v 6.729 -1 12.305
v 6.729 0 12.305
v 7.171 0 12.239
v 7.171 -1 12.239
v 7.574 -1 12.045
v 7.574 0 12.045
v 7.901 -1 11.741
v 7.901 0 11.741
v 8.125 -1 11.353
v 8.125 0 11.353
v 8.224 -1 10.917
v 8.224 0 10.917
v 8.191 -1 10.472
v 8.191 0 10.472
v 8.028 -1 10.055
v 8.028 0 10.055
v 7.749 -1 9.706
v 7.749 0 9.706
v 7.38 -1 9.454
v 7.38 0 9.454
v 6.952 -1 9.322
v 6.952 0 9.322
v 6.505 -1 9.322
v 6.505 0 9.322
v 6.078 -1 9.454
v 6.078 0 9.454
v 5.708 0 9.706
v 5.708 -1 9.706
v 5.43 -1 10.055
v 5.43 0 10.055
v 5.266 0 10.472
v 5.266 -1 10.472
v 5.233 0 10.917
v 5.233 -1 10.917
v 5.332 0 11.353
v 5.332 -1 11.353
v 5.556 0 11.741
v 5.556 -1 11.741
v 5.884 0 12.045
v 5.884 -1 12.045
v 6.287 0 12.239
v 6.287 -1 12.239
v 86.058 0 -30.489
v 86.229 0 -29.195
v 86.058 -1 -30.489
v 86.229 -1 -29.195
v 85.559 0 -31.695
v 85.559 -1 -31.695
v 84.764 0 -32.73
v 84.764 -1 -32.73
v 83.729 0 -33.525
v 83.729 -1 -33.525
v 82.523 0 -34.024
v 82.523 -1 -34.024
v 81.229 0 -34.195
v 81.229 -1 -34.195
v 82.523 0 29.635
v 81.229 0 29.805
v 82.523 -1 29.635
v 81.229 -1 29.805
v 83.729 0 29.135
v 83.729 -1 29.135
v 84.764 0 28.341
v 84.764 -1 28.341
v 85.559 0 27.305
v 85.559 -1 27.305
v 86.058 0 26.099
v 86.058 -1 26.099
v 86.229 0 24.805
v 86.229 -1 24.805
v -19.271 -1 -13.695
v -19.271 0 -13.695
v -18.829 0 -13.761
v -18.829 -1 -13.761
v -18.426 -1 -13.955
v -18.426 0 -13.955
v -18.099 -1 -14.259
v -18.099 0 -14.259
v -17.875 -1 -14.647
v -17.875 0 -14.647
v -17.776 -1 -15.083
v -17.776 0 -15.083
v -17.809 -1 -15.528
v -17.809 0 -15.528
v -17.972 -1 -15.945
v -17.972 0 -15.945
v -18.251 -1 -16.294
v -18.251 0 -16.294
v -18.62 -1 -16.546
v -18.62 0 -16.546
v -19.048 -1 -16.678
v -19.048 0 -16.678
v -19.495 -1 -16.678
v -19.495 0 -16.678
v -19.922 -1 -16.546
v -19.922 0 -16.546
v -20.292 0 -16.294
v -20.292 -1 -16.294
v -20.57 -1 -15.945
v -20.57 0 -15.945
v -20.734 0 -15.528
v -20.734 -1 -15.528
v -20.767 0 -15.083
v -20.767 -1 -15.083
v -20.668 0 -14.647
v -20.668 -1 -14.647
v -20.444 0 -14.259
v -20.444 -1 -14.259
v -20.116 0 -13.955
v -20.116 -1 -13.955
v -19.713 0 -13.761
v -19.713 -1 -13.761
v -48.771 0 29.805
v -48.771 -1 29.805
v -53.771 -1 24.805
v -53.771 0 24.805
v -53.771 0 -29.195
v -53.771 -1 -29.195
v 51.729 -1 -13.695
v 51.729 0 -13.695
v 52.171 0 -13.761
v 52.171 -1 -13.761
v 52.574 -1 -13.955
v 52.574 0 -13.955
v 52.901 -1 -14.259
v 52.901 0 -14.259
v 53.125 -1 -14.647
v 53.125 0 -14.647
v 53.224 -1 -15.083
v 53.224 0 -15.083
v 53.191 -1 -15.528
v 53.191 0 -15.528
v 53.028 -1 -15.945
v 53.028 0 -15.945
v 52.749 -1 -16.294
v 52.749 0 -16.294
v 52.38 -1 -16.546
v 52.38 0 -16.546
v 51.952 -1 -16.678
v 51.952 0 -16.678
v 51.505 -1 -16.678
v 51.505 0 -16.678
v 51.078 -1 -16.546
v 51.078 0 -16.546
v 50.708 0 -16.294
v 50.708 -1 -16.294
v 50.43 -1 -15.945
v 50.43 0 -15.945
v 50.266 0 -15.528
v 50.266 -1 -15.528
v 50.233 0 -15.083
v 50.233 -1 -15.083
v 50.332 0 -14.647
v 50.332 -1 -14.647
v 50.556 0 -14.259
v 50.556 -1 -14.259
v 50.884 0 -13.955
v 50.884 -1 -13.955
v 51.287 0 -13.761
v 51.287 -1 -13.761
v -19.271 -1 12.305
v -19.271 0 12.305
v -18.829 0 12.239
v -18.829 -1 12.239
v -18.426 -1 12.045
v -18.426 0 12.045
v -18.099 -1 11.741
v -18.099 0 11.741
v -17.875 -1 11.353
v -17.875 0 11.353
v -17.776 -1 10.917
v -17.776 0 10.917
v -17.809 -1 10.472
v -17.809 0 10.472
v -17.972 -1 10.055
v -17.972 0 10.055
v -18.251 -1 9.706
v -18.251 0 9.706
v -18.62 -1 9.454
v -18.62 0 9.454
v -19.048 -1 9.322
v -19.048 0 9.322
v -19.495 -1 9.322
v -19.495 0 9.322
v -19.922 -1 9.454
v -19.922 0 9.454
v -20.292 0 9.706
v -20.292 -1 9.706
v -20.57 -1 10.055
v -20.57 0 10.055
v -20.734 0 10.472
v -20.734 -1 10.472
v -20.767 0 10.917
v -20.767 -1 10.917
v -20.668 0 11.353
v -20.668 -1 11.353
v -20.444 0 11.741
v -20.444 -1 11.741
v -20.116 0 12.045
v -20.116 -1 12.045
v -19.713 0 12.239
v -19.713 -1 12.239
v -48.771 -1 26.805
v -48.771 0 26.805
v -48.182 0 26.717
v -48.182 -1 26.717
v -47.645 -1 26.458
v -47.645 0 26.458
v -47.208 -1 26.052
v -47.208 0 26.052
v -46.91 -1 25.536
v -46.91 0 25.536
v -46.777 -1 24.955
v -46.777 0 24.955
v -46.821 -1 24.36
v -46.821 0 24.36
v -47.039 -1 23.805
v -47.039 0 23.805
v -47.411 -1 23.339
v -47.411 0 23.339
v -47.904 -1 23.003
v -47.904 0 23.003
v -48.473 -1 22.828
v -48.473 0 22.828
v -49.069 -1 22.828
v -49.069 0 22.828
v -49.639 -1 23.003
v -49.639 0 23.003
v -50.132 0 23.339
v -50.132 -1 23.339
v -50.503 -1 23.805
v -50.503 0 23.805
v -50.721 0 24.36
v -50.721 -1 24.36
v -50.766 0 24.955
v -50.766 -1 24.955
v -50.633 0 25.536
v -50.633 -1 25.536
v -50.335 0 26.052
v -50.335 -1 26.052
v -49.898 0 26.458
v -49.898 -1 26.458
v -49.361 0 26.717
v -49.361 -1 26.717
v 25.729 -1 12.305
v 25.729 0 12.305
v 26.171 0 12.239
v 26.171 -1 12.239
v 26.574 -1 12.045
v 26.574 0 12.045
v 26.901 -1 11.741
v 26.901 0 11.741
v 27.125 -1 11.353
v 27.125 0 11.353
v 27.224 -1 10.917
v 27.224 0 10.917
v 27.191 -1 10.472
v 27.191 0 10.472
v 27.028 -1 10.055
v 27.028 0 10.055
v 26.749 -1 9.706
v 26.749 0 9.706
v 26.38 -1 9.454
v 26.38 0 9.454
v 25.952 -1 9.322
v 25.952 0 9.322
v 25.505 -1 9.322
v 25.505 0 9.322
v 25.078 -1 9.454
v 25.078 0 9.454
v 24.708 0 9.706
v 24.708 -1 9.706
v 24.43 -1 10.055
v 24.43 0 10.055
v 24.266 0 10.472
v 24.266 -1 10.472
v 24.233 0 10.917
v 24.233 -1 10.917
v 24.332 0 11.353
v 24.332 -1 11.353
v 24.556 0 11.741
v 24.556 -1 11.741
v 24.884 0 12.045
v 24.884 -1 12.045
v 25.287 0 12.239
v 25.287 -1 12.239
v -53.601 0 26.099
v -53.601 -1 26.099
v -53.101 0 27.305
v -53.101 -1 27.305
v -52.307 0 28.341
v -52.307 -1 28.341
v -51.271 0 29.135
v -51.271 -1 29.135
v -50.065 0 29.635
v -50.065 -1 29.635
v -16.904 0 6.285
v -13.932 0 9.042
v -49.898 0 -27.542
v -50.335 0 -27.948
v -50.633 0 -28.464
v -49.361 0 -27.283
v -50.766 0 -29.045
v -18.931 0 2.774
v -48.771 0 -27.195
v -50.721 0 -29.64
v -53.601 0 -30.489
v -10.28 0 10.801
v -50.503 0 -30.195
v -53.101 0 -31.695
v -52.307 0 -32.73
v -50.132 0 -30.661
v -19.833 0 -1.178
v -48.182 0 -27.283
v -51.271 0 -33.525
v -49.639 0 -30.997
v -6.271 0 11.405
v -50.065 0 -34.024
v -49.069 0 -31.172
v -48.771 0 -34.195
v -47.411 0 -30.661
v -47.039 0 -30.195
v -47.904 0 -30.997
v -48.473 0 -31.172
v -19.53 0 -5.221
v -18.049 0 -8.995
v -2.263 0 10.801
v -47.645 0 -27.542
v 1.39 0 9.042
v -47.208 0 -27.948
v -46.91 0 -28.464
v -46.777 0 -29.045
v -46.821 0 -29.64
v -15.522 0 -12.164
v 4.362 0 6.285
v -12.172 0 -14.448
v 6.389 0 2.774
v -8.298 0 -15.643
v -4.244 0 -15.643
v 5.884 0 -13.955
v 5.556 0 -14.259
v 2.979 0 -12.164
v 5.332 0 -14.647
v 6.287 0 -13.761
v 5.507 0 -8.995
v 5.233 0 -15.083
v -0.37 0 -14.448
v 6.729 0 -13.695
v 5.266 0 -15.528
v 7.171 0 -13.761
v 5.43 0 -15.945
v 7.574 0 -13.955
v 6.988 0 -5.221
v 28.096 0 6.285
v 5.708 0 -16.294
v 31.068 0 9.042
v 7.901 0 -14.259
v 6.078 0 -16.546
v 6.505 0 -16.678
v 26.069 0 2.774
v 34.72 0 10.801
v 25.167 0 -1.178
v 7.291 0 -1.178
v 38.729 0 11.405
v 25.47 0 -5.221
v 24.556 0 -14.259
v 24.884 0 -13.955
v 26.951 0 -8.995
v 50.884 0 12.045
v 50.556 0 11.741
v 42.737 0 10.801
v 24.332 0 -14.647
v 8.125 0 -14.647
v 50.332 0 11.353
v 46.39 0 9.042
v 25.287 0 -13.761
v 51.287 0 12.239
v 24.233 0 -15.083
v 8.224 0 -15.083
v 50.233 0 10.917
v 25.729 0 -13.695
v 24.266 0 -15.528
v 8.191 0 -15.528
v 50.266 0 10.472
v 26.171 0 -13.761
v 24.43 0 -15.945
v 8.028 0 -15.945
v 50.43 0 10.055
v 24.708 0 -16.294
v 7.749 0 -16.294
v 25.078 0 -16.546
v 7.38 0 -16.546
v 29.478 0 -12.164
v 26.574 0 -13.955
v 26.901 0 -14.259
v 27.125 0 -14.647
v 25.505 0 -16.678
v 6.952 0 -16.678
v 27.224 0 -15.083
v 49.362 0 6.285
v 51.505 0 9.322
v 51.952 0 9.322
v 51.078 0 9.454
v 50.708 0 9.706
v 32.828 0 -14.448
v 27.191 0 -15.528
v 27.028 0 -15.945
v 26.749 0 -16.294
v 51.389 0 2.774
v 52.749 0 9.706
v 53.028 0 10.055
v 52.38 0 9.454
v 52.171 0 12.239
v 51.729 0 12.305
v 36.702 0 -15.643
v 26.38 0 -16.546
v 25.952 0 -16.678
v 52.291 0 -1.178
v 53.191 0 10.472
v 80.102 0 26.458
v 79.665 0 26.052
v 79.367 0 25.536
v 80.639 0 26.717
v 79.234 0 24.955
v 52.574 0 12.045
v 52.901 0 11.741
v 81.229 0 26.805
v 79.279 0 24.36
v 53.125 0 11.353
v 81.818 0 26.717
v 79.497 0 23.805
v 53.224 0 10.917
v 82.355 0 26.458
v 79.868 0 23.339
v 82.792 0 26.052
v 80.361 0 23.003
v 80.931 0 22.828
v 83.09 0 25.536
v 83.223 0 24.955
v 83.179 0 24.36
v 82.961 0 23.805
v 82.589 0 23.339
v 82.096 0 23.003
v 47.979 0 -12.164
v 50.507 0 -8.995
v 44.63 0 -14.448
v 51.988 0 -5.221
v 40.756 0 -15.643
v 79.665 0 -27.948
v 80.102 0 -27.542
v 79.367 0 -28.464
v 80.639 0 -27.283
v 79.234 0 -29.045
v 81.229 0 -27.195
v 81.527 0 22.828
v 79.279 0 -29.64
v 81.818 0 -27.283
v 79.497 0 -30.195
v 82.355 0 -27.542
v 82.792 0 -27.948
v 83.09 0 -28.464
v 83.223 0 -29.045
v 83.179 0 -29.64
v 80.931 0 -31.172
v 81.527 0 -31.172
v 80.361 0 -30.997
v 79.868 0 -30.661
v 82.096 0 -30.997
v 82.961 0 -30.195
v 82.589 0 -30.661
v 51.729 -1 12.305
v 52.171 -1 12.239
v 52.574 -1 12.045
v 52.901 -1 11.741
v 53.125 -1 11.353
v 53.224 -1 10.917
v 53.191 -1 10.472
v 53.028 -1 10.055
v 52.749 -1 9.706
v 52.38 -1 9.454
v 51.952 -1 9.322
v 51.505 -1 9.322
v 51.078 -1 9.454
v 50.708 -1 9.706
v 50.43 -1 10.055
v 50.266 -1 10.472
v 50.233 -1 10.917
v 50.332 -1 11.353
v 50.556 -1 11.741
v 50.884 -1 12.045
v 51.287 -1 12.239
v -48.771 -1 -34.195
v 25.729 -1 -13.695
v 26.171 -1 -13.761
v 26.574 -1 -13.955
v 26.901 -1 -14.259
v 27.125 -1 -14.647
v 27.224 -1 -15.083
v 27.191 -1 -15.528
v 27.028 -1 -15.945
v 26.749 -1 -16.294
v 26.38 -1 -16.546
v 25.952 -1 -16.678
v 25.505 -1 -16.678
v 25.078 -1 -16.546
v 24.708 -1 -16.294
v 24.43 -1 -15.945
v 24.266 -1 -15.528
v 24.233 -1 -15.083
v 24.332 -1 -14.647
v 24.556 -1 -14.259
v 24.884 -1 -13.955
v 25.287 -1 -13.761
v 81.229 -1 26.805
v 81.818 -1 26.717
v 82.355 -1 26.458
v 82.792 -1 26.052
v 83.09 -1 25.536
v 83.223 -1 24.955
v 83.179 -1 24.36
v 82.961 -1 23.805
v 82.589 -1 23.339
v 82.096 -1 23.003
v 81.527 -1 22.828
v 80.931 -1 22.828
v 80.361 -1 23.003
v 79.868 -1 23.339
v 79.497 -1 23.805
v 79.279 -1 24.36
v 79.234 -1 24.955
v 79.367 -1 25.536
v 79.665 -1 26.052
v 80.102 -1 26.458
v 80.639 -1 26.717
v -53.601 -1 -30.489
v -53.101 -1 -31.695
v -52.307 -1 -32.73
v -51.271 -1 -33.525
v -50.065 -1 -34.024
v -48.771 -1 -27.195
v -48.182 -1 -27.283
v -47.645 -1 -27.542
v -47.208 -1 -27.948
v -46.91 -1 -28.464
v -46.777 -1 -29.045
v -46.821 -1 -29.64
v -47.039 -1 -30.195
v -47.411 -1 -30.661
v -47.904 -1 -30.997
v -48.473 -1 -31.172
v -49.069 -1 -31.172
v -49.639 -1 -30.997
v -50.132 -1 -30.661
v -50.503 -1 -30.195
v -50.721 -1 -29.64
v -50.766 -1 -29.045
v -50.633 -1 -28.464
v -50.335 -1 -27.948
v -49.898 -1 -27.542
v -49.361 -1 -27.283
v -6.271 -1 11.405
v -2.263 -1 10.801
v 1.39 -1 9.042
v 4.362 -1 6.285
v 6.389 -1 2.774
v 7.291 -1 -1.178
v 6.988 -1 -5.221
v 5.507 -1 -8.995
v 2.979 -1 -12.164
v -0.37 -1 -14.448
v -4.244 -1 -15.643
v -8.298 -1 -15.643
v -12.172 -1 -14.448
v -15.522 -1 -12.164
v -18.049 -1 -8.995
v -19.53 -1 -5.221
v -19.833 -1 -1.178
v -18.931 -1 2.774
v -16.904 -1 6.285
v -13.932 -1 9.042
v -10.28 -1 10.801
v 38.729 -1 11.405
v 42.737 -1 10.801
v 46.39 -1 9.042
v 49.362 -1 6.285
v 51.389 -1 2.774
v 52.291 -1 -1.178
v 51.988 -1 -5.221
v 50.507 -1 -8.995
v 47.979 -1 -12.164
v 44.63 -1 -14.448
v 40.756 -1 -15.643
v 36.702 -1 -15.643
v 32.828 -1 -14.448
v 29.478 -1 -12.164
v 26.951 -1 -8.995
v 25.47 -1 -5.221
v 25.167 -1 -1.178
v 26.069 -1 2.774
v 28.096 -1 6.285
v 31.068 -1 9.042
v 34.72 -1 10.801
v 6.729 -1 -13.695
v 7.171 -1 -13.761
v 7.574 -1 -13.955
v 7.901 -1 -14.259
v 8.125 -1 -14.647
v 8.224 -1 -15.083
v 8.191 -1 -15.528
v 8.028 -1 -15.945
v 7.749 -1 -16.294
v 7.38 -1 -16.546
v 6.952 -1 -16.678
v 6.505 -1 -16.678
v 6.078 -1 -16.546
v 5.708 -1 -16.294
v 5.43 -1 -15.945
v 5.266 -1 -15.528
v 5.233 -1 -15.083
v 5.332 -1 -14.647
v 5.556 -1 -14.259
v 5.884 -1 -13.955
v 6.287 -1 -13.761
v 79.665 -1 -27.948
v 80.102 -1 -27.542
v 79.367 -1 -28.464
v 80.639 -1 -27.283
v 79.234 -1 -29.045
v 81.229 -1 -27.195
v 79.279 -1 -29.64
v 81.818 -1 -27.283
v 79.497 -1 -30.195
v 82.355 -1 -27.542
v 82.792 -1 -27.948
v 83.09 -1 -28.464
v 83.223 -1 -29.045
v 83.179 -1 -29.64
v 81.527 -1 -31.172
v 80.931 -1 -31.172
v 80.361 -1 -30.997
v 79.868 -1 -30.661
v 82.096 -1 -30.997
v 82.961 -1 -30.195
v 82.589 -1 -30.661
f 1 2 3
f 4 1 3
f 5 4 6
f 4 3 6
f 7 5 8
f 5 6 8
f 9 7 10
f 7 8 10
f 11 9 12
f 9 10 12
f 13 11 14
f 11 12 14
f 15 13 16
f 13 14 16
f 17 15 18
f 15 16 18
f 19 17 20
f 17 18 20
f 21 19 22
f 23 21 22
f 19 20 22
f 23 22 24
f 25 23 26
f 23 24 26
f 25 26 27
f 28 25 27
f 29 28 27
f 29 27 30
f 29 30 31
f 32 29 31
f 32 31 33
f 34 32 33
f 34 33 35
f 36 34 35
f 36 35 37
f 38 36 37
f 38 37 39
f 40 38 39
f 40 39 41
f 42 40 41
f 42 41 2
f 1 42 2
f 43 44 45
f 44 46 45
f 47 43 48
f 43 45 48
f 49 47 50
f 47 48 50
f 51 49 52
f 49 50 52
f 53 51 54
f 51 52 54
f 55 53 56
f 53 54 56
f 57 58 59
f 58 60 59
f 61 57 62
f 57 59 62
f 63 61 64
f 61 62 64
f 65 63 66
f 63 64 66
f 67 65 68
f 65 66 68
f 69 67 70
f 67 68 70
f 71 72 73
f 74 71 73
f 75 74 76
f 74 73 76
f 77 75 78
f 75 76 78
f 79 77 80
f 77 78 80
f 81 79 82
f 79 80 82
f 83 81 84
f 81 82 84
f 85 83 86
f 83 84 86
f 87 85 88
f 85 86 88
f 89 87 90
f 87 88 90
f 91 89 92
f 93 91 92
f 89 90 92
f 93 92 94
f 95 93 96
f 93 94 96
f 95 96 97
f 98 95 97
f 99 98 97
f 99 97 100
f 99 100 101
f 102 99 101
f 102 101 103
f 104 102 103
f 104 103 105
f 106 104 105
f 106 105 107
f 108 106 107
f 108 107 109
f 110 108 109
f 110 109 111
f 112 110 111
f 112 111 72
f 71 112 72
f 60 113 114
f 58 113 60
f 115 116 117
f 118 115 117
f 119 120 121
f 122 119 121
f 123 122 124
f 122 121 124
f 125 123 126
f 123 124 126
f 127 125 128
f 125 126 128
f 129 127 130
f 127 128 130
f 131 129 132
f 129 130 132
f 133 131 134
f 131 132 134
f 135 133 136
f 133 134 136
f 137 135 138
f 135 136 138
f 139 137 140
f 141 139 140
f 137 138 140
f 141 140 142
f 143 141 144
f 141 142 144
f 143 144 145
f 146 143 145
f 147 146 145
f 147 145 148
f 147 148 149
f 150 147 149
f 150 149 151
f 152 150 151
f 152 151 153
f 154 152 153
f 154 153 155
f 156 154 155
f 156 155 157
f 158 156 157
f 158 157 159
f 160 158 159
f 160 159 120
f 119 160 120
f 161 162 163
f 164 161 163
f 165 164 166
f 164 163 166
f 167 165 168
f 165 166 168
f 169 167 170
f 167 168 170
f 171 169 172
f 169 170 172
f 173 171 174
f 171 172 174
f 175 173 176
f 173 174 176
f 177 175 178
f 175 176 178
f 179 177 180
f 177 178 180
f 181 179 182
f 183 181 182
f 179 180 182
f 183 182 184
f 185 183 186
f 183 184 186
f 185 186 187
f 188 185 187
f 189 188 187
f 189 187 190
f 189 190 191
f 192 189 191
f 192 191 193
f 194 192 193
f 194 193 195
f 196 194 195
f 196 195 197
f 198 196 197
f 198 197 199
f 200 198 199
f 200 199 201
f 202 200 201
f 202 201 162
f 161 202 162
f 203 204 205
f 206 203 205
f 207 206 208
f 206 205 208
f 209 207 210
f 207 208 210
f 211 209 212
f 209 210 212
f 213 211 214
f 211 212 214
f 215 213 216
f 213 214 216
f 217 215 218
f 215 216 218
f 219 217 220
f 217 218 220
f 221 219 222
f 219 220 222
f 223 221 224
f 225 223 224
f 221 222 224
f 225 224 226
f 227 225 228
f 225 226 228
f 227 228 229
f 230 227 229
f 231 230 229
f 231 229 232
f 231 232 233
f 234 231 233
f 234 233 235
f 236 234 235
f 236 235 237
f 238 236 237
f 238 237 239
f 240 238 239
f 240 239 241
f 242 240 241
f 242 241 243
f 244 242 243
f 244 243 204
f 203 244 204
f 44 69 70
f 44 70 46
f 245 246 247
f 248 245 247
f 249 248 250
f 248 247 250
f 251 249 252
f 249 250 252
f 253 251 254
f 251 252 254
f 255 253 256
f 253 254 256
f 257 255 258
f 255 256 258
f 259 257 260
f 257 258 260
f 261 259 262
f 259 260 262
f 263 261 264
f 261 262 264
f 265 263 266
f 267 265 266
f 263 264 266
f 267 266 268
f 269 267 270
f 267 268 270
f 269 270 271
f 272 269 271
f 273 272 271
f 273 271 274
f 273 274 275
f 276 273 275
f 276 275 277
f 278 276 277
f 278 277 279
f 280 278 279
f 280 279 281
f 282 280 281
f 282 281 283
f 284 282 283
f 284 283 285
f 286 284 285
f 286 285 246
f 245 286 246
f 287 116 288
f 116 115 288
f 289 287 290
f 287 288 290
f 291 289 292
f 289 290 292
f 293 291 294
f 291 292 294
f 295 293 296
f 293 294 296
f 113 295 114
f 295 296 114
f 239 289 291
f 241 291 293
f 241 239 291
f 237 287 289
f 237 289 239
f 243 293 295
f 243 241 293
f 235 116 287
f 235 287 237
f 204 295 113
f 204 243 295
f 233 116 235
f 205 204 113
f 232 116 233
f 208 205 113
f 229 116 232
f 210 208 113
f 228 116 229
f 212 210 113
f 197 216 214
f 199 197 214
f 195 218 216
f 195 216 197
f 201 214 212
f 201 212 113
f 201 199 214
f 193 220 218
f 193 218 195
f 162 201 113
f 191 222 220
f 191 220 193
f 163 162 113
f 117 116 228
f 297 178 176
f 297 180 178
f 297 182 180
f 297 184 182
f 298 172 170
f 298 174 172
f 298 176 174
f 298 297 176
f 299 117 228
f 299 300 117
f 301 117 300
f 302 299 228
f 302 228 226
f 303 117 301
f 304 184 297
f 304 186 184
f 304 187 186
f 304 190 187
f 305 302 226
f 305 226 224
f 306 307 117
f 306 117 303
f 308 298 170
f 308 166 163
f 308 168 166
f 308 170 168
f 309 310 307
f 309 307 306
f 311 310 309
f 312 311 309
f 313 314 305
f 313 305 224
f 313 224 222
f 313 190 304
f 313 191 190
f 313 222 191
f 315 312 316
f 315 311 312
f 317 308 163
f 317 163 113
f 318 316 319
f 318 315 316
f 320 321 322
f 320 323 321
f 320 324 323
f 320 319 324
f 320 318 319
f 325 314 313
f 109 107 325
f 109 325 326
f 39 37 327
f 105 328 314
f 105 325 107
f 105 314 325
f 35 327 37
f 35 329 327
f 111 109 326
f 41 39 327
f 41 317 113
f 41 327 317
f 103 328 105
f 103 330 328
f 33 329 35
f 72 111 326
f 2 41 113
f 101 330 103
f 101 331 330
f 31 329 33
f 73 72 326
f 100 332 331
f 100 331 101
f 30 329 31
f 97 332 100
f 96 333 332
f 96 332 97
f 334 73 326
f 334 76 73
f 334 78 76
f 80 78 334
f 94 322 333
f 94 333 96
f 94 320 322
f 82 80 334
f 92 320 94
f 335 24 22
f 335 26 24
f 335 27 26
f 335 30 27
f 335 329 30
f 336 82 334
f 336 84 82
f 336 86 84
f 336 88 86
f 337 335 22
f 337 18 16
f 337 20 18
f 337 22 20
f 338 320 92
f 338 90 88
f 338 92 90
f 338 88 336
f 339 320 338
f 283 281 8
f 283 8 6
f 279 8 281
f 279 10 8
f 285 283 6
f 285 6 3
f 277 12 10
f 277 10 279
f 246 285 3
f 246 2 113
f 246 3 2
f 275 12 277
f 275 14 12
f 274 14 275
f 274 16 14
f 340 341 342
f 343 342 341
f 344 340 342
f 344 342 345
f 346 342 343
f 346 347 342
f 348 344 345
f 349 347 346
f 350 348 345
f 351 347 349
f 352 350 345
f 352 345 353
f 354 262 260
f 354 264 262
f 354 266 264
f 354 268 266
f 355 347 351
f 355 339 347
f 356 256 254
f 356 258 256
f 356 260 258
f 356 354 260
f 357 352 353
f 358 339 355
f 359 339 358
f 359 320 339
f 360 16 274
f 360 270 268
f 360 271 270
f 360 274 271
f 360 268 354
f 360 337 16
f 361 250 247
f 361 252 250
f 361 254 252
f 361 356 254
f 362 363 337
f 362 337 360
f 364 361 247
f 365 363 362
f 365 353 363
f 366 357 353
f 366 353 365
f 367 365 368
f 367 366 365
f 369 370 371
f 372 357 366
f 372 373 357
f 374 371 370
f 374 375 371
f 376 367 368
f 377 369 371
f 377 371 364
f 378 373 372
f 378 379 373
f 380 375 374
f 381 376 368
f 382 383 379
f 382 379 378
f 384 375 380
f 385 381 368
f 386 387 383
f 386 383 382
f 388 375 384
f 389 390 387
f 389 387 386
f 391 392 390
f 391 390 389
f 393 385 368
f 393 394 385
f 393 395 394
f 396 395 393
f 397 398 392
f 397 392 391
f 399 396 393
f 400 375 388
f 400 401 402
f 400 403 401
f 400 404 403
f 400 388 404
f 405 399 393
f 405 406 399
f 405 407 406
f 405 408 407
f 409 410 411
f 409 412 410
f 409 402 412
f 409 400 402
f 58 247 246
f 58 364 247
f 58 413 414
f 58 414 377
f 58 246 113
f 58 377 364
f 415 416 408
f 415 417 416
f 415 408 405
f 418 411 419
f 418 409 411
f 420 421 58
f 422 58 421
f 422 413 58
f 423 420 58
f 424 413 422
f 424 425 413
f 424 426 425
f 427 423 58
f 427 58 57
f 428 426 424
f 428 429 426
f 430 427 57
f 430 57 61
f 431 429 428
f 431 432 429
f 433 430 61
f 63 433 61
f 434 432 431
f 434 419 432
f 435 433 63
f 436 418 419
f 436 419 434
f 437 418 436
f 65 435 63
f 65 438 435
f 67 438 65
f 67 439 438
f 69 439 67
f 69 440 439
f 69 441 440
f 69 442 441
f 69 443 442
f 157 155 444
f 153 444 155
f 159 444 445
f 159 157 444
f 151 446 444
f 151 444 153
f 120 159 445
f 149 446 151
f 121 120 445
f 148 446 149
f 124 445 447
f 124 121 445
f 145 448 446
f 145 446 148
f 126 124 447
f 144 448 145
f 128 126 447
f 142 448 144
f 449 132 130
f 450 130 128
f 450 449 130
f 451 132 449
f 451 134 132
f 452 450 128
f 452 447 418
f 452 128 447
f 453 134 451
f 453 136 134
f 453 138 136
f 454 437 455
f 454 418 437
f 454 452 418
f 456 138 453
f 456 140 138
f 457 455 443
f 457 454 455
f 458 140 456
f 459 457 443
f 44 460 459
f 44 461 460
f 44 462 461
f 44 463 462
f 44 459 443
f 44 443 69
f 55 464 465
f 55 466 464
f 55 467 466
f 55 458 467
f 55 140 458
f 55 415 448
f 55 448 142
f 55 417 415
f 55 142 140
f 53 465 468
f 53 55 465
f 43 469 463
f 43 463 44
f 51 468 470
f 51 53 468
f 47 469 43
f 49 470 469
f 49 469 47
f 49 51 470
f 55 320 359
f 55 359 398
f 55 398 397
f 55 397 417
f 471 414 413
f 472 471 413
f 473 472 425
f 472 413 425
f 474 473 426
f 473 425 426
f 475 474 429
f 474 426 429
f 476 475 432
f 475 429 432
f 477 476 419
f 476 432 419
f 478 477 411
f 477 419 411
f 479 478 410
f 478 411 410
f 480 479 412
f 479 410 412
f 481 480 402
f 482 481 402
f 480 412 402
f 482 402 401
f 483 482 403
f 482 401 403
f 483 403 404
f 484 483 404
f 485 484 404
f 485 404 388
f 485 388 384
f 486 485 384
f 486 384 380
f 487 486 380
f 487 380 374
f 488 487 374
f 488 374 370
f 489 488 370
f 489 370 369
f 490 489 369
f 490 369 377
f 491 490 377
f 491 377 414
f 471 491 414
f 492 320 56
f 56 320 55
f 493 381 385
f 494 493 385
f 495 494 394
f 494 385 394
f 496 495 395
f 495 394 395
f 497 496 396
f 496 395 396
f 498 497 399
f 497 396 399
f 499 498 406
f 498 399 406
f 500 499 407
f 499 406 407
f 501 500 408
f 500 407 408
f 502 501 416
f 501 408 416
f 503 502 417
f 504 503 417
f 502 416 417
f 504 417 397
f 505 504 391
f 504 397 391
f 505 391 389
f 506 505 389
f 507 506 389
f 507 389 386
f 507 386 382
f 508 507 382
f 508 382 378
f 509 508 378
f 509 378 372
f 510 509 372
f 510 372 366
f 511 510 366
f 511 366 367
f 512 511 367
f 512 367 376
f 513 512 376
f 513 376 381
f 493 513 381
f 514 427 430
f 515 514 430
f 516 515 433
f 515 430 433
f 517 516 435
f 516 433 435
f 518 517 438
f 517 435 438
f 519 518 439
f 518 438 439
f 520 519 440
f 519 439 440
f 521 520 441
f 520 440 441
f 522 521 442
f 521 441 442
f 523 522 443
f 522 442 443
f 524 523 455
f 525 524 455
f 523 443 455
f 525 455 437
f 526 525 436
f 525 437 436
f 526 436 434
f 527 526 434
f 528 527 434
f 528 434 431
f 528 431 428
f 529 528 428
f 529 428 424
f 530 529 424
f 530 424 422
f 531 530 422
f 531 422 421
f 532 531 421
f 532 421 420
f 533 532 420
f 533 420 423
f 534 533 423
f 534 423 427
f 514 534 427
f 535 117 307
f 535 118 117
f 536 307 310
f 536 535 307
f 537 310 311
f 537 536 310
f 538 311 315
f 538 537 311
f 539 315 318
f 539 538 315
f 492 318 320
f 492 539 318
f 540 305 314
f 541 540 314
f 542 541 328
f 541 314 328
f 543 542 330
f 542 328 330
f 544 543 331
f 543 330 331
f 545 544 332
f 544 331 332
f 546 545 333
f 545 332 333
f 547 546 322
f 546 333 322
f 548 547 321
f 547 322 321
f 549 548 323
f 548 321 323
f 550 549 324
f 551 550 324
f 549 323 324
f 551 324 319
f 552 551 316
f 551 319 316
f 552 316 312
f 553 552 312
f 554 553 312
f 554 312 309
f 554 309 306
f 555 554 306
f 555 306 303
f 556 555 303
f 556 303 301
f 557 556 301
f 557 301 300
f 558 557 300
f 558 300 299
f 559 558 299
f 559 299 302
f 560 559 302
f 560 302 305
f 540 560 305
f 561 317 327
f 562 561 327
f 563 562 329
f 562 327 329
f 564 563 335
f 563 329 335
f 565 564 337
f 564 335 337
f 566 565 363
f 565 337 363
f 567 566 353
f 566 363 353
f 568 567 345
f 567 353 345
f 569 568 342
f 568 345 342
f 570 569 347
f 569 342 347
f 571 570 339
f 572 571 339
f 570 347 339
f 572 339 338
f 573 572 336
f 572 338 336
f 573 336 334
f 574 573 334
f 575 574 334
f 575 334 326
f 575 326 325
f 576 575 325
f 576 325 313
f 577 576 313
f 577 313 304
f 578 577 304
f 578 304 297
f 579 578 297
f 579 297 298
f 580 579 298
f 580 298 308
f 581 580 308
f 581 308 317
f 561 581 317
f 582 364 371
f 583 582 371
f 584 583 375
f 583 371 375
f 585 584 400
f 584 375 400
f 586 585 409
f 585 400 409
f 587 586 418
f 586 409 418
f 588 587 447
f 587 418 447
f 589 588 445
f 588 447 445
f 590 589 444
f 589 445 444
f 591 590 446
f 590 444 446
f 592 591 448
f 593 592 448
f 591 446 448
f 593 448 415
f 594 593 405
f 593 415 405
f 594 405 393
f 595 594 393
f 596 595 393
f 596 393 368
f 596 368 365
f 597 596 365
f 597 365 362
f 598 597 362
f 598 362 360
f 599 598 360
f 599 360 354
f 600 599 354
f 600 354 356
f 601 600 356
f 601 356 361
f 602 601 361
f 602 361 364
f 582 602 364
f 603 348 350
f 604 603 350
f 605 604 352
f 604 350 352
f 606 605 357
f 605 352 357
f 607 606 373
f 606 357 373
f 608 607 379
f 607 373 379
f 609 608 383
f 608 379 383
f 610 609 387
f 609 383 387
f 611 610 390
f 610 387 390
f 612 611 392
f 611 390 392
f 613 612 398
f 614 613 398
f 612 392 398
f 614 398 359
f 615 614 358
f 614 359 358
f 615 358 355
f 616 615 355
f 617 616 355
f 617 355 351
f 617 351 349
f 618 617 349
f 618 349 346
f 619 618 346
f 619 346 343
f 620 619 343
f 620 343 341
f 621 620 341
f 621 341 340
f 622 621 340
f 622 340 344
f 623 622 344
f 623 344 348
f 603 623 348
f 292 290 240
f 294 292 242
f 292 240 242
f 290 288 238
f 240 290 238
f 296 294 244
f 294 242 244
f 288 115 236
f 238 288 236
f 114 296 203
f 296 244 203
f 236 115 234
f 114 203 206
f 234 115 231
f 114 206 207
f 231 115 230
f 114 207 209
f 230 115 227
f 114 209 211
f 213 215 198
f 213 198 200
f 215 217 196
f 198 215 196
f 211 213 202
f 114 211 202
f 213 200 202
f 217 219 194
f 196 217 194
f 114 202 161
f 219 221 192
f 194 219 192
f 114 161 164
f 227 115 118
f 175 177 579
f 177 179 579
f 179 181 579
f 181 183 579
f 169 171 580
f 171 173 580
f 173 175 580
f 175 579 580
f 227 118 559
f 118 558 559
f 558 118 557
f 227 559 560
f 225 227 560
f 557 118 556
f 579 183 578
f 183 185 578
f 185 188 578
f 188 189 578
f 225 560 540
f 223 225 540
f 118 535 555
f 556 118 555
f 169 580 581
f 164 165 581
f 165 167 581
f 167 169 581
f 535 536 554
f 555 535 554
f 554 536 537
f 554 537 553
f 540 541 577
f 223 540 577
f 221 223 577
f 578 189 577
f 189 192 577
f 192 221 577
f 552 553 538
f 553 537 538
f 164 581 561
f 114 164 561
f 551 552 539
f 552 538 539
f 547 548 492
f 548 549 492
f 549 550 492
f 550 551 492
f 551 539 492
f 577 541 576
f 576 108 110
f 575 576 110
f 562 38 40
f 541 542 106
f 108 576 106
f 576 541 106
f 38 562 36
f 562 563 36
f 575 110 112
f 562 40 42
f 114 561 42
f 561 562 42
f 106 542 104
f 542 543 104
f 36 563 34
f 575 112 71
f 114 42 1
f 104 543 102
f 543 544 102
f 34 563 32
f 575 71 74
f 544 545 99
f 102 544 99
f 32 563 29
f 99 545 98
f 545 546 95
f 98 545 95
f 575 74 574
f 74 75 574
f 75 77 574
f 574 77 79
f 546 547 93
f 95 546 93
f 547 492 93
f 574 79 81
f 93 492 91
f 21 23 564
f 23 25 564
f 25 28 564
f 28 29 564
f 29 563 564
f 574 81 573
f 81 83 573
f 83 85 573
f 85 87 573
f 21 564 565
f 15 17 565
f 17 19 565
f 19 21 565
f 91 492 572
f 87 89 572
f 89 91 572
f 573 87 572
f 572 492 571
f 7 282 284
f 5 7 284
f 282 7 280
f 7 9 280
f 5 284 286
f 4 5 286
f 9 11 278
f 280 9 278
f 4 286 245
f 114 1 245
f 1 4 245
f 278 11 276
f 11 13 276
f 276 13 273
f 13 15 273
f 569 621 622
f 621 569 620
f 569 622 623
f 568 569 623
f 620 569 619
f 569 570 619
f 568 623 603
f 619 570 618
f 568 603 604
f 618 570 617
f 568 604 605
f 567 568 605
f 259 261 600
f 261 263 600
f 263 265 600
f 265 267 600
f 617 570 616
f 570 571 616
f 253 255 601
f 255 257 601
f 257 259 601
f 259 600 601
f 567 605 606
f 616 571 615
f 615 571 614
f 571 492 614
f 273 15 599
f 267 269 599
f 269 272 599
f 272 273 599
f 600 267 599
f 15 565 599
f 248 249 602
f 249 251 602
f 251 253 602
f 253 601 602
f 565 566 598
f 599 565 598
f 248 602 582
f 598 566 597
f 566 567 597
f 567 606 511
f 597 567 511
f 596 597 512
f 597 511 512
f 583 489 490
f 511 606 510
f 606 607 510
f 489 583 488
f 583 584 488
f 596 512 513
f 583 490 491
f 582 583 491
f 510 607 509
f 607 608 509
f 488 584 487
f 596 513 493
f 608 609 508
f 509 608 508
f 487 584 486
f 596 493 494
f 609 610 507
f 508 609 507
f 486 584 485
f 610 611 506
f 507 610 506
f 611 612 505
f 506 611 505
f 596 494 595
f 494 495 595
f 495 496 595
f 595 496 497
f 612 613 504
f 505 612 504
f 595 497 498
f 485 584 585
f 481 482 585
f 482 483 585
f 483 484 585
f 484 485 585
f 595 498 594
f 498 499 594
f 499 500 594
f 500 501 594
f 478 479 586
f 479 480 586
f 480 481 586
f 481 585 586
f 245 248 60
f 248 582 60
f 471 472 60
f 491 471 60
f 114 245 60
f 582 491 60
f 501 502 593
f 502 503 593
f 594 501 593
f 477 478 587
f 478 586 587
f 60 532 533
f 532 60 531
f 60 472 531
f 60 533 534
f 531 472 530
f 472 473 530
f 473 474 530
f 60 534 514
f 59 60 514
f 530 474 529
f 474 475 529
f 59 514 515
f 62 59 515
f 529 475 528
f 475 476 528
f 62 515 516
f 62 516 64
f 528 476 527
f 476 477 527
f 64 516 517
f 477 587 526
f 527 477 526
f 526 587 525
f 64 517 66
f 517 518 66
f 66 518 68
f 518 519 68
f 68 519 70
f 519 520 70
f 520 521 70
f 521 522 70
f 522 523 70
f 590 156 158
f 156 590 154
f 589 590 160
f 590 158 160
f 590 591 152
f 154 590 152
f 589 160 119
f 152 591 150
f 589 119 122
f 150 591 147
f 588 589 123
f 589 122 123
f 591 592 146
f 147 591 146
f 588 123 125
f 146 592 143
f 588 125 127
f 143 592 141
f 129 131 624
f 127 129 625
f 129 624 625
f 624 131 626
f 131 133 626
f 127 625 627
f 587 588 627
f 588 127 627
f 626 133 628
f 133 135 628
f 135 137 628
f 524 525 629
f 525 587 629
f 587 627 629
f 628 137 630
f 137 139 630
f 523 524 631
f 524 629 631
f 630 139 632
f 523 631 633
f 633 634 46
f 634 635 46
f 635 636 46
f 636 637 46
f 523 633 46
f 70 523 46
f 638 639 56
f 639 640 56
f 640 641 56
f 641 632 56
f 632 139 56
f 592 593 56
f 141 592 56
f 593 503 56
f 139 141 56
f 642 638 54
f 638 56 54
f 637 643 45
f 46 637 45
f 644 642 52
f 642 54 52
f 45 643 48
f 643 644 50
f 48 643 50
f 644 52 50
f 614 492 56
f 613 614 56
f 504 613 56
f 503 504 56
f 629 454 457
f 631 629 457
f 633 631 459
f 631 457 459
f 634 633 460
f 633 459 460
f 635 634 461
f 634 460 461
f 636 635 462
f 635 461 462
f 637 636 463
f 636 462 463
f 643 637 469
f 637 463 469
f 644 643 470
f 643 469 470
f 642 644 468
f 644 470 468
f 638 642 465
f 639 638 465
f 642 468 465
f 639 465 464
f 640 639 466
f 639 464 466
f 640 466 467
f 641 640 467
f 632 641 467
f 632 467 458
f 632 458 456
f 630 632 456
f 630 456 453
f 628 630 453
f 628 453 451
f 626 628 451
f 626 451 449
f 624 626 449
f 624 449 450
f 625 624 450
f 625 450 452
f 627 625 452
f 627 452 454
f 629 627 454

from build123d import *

# Parameters (mm, degrees)
SKETCH_1_W             = 140
SKETCH_1_H             = 64
SM_BASE_FLANGE_1_DEPTH = 1
FILLET_1_R             = 5
SKETCH_4_R             = 2
CUT_EXTRUDE_2_DEPTH    = 10
SKETCH_5_R             = 13.6
SKETCH_5_R_2           = 1.5
CUT_EXTRUDE_3_DEPTH    = 10


# Sheet-metal steps are written as plain solids
with BuildPart() as part:
    # Sketch 1 → Базовая кромка1 (new body)
    with BuildSketch(Plane(origin=(0, 0, 0), x_dir=(1, 0, 0), z_dir=(0, 1, 0))):
        with Locations((16.228693113, 2.194635649)):
            Rectangle(SKETCH_1_W, SKETCH_1_H)
    extrude(amount=-SM_BASE_FLANGE_1_DEPTH)

    # Скругление1
    fillet_1_edges = [part.edges().sort_by_distance(p)[0] for p in [
        (-53.771306887, -0.5, -34.194635649),
        (86.228693113, -0.5, -34.194635649),
        (86.228693113, -0.5, 29.805364351),
        (-53.771306887, -0.5, 29.805364351),
    ]]
    fillet(fillet_1_edges, radius=FILLET_1_R)

    # Эскиз4 → Вырез-Вытянуть2 (cut)
    with BuildSketch(Plane(origin=(0, 0, 0), x_dir=(1, 0, 0), z_dir=(0, 1, 0))):
        with Locations(Location((-48.771306887, 29.194635649, 0), (0, 0, 270))):
            Circle(SKETCH_4_R)
        with Locations(Location((81.228693113, 29.194635649, 0), (0, 0, 270))):
            Circle(SKETCH_4_R)
        with Locations(Location((-48.771306887, -24.805364351, 0), (0, 0, 270))):
            Circle(SKETCH_4_R)
        with Locations(Location((81.228693113, -24.805364351, 0), (0, 0, 270))):
            Circle(SKETCH_4_R)
    extrude(amount=-CUT_EXTRUDE_2_DEPTH, mode=Mode.SUBTRACT)

    # Эскиз5 → Вырез-Вытянуть3 (cut)
    with BuildSketch(Plane(origin=(0, 0, 0), x_dir=(1, 0, 0), z_dir=(0, 1, 0))):
        with Locations(Location((-6.271306887, 2.194635649, 0), (0, 0, 270))):
            Circle(SKETCH_5_R)
        with Locations(Location((38.728693113, 2.194635649, 0), (0, 0, 270))):
            Circle(SKETCH_5_R)
        with Locations(Location((-19.271306887, 15.194635649, 0), (0, 0, 270))):
            Circle(SKETCH_5_R_2)
        with Locations(Location((6.728693113, 15.194635649, 0), (0, 0, 270))):
            Circle(SKETCH_5_R_2)
        with Locations(Location((-19.271306887, -10.805364351, 0), (0, 0, 270))):
            Circle(SKETCH_5_R_2)
        with Locations(Location((6.728693113, -10.805364351, 0), (0, 0, 270))):
            Circle(SKETCH_5_R_2)
        with Locations(Location((25.728693113, 15.194635649, 0), (0, 0, 270))):
            Circle(SKETCH_5_R_2)
        with Locations(Location((51.728693113, 15.194635649, 0), (0, 0, 270))):
            Circle(SKETCH_5_R_2)
        with Locations(Location((25.728693113, -10.805364351, 0), (0, 0, 270))):
            Circle(SKETCH_5_R_2)
        with Locations(Location((51.728693113, -10.805364351, 0), (0, 0, 270))):
            Circle(SKETCH_5_R_2)
    extrude(amount=-CUT_EXTRUDE_3_DEPTH, mode=Mode.SUBTRACT)


solid = part.part
